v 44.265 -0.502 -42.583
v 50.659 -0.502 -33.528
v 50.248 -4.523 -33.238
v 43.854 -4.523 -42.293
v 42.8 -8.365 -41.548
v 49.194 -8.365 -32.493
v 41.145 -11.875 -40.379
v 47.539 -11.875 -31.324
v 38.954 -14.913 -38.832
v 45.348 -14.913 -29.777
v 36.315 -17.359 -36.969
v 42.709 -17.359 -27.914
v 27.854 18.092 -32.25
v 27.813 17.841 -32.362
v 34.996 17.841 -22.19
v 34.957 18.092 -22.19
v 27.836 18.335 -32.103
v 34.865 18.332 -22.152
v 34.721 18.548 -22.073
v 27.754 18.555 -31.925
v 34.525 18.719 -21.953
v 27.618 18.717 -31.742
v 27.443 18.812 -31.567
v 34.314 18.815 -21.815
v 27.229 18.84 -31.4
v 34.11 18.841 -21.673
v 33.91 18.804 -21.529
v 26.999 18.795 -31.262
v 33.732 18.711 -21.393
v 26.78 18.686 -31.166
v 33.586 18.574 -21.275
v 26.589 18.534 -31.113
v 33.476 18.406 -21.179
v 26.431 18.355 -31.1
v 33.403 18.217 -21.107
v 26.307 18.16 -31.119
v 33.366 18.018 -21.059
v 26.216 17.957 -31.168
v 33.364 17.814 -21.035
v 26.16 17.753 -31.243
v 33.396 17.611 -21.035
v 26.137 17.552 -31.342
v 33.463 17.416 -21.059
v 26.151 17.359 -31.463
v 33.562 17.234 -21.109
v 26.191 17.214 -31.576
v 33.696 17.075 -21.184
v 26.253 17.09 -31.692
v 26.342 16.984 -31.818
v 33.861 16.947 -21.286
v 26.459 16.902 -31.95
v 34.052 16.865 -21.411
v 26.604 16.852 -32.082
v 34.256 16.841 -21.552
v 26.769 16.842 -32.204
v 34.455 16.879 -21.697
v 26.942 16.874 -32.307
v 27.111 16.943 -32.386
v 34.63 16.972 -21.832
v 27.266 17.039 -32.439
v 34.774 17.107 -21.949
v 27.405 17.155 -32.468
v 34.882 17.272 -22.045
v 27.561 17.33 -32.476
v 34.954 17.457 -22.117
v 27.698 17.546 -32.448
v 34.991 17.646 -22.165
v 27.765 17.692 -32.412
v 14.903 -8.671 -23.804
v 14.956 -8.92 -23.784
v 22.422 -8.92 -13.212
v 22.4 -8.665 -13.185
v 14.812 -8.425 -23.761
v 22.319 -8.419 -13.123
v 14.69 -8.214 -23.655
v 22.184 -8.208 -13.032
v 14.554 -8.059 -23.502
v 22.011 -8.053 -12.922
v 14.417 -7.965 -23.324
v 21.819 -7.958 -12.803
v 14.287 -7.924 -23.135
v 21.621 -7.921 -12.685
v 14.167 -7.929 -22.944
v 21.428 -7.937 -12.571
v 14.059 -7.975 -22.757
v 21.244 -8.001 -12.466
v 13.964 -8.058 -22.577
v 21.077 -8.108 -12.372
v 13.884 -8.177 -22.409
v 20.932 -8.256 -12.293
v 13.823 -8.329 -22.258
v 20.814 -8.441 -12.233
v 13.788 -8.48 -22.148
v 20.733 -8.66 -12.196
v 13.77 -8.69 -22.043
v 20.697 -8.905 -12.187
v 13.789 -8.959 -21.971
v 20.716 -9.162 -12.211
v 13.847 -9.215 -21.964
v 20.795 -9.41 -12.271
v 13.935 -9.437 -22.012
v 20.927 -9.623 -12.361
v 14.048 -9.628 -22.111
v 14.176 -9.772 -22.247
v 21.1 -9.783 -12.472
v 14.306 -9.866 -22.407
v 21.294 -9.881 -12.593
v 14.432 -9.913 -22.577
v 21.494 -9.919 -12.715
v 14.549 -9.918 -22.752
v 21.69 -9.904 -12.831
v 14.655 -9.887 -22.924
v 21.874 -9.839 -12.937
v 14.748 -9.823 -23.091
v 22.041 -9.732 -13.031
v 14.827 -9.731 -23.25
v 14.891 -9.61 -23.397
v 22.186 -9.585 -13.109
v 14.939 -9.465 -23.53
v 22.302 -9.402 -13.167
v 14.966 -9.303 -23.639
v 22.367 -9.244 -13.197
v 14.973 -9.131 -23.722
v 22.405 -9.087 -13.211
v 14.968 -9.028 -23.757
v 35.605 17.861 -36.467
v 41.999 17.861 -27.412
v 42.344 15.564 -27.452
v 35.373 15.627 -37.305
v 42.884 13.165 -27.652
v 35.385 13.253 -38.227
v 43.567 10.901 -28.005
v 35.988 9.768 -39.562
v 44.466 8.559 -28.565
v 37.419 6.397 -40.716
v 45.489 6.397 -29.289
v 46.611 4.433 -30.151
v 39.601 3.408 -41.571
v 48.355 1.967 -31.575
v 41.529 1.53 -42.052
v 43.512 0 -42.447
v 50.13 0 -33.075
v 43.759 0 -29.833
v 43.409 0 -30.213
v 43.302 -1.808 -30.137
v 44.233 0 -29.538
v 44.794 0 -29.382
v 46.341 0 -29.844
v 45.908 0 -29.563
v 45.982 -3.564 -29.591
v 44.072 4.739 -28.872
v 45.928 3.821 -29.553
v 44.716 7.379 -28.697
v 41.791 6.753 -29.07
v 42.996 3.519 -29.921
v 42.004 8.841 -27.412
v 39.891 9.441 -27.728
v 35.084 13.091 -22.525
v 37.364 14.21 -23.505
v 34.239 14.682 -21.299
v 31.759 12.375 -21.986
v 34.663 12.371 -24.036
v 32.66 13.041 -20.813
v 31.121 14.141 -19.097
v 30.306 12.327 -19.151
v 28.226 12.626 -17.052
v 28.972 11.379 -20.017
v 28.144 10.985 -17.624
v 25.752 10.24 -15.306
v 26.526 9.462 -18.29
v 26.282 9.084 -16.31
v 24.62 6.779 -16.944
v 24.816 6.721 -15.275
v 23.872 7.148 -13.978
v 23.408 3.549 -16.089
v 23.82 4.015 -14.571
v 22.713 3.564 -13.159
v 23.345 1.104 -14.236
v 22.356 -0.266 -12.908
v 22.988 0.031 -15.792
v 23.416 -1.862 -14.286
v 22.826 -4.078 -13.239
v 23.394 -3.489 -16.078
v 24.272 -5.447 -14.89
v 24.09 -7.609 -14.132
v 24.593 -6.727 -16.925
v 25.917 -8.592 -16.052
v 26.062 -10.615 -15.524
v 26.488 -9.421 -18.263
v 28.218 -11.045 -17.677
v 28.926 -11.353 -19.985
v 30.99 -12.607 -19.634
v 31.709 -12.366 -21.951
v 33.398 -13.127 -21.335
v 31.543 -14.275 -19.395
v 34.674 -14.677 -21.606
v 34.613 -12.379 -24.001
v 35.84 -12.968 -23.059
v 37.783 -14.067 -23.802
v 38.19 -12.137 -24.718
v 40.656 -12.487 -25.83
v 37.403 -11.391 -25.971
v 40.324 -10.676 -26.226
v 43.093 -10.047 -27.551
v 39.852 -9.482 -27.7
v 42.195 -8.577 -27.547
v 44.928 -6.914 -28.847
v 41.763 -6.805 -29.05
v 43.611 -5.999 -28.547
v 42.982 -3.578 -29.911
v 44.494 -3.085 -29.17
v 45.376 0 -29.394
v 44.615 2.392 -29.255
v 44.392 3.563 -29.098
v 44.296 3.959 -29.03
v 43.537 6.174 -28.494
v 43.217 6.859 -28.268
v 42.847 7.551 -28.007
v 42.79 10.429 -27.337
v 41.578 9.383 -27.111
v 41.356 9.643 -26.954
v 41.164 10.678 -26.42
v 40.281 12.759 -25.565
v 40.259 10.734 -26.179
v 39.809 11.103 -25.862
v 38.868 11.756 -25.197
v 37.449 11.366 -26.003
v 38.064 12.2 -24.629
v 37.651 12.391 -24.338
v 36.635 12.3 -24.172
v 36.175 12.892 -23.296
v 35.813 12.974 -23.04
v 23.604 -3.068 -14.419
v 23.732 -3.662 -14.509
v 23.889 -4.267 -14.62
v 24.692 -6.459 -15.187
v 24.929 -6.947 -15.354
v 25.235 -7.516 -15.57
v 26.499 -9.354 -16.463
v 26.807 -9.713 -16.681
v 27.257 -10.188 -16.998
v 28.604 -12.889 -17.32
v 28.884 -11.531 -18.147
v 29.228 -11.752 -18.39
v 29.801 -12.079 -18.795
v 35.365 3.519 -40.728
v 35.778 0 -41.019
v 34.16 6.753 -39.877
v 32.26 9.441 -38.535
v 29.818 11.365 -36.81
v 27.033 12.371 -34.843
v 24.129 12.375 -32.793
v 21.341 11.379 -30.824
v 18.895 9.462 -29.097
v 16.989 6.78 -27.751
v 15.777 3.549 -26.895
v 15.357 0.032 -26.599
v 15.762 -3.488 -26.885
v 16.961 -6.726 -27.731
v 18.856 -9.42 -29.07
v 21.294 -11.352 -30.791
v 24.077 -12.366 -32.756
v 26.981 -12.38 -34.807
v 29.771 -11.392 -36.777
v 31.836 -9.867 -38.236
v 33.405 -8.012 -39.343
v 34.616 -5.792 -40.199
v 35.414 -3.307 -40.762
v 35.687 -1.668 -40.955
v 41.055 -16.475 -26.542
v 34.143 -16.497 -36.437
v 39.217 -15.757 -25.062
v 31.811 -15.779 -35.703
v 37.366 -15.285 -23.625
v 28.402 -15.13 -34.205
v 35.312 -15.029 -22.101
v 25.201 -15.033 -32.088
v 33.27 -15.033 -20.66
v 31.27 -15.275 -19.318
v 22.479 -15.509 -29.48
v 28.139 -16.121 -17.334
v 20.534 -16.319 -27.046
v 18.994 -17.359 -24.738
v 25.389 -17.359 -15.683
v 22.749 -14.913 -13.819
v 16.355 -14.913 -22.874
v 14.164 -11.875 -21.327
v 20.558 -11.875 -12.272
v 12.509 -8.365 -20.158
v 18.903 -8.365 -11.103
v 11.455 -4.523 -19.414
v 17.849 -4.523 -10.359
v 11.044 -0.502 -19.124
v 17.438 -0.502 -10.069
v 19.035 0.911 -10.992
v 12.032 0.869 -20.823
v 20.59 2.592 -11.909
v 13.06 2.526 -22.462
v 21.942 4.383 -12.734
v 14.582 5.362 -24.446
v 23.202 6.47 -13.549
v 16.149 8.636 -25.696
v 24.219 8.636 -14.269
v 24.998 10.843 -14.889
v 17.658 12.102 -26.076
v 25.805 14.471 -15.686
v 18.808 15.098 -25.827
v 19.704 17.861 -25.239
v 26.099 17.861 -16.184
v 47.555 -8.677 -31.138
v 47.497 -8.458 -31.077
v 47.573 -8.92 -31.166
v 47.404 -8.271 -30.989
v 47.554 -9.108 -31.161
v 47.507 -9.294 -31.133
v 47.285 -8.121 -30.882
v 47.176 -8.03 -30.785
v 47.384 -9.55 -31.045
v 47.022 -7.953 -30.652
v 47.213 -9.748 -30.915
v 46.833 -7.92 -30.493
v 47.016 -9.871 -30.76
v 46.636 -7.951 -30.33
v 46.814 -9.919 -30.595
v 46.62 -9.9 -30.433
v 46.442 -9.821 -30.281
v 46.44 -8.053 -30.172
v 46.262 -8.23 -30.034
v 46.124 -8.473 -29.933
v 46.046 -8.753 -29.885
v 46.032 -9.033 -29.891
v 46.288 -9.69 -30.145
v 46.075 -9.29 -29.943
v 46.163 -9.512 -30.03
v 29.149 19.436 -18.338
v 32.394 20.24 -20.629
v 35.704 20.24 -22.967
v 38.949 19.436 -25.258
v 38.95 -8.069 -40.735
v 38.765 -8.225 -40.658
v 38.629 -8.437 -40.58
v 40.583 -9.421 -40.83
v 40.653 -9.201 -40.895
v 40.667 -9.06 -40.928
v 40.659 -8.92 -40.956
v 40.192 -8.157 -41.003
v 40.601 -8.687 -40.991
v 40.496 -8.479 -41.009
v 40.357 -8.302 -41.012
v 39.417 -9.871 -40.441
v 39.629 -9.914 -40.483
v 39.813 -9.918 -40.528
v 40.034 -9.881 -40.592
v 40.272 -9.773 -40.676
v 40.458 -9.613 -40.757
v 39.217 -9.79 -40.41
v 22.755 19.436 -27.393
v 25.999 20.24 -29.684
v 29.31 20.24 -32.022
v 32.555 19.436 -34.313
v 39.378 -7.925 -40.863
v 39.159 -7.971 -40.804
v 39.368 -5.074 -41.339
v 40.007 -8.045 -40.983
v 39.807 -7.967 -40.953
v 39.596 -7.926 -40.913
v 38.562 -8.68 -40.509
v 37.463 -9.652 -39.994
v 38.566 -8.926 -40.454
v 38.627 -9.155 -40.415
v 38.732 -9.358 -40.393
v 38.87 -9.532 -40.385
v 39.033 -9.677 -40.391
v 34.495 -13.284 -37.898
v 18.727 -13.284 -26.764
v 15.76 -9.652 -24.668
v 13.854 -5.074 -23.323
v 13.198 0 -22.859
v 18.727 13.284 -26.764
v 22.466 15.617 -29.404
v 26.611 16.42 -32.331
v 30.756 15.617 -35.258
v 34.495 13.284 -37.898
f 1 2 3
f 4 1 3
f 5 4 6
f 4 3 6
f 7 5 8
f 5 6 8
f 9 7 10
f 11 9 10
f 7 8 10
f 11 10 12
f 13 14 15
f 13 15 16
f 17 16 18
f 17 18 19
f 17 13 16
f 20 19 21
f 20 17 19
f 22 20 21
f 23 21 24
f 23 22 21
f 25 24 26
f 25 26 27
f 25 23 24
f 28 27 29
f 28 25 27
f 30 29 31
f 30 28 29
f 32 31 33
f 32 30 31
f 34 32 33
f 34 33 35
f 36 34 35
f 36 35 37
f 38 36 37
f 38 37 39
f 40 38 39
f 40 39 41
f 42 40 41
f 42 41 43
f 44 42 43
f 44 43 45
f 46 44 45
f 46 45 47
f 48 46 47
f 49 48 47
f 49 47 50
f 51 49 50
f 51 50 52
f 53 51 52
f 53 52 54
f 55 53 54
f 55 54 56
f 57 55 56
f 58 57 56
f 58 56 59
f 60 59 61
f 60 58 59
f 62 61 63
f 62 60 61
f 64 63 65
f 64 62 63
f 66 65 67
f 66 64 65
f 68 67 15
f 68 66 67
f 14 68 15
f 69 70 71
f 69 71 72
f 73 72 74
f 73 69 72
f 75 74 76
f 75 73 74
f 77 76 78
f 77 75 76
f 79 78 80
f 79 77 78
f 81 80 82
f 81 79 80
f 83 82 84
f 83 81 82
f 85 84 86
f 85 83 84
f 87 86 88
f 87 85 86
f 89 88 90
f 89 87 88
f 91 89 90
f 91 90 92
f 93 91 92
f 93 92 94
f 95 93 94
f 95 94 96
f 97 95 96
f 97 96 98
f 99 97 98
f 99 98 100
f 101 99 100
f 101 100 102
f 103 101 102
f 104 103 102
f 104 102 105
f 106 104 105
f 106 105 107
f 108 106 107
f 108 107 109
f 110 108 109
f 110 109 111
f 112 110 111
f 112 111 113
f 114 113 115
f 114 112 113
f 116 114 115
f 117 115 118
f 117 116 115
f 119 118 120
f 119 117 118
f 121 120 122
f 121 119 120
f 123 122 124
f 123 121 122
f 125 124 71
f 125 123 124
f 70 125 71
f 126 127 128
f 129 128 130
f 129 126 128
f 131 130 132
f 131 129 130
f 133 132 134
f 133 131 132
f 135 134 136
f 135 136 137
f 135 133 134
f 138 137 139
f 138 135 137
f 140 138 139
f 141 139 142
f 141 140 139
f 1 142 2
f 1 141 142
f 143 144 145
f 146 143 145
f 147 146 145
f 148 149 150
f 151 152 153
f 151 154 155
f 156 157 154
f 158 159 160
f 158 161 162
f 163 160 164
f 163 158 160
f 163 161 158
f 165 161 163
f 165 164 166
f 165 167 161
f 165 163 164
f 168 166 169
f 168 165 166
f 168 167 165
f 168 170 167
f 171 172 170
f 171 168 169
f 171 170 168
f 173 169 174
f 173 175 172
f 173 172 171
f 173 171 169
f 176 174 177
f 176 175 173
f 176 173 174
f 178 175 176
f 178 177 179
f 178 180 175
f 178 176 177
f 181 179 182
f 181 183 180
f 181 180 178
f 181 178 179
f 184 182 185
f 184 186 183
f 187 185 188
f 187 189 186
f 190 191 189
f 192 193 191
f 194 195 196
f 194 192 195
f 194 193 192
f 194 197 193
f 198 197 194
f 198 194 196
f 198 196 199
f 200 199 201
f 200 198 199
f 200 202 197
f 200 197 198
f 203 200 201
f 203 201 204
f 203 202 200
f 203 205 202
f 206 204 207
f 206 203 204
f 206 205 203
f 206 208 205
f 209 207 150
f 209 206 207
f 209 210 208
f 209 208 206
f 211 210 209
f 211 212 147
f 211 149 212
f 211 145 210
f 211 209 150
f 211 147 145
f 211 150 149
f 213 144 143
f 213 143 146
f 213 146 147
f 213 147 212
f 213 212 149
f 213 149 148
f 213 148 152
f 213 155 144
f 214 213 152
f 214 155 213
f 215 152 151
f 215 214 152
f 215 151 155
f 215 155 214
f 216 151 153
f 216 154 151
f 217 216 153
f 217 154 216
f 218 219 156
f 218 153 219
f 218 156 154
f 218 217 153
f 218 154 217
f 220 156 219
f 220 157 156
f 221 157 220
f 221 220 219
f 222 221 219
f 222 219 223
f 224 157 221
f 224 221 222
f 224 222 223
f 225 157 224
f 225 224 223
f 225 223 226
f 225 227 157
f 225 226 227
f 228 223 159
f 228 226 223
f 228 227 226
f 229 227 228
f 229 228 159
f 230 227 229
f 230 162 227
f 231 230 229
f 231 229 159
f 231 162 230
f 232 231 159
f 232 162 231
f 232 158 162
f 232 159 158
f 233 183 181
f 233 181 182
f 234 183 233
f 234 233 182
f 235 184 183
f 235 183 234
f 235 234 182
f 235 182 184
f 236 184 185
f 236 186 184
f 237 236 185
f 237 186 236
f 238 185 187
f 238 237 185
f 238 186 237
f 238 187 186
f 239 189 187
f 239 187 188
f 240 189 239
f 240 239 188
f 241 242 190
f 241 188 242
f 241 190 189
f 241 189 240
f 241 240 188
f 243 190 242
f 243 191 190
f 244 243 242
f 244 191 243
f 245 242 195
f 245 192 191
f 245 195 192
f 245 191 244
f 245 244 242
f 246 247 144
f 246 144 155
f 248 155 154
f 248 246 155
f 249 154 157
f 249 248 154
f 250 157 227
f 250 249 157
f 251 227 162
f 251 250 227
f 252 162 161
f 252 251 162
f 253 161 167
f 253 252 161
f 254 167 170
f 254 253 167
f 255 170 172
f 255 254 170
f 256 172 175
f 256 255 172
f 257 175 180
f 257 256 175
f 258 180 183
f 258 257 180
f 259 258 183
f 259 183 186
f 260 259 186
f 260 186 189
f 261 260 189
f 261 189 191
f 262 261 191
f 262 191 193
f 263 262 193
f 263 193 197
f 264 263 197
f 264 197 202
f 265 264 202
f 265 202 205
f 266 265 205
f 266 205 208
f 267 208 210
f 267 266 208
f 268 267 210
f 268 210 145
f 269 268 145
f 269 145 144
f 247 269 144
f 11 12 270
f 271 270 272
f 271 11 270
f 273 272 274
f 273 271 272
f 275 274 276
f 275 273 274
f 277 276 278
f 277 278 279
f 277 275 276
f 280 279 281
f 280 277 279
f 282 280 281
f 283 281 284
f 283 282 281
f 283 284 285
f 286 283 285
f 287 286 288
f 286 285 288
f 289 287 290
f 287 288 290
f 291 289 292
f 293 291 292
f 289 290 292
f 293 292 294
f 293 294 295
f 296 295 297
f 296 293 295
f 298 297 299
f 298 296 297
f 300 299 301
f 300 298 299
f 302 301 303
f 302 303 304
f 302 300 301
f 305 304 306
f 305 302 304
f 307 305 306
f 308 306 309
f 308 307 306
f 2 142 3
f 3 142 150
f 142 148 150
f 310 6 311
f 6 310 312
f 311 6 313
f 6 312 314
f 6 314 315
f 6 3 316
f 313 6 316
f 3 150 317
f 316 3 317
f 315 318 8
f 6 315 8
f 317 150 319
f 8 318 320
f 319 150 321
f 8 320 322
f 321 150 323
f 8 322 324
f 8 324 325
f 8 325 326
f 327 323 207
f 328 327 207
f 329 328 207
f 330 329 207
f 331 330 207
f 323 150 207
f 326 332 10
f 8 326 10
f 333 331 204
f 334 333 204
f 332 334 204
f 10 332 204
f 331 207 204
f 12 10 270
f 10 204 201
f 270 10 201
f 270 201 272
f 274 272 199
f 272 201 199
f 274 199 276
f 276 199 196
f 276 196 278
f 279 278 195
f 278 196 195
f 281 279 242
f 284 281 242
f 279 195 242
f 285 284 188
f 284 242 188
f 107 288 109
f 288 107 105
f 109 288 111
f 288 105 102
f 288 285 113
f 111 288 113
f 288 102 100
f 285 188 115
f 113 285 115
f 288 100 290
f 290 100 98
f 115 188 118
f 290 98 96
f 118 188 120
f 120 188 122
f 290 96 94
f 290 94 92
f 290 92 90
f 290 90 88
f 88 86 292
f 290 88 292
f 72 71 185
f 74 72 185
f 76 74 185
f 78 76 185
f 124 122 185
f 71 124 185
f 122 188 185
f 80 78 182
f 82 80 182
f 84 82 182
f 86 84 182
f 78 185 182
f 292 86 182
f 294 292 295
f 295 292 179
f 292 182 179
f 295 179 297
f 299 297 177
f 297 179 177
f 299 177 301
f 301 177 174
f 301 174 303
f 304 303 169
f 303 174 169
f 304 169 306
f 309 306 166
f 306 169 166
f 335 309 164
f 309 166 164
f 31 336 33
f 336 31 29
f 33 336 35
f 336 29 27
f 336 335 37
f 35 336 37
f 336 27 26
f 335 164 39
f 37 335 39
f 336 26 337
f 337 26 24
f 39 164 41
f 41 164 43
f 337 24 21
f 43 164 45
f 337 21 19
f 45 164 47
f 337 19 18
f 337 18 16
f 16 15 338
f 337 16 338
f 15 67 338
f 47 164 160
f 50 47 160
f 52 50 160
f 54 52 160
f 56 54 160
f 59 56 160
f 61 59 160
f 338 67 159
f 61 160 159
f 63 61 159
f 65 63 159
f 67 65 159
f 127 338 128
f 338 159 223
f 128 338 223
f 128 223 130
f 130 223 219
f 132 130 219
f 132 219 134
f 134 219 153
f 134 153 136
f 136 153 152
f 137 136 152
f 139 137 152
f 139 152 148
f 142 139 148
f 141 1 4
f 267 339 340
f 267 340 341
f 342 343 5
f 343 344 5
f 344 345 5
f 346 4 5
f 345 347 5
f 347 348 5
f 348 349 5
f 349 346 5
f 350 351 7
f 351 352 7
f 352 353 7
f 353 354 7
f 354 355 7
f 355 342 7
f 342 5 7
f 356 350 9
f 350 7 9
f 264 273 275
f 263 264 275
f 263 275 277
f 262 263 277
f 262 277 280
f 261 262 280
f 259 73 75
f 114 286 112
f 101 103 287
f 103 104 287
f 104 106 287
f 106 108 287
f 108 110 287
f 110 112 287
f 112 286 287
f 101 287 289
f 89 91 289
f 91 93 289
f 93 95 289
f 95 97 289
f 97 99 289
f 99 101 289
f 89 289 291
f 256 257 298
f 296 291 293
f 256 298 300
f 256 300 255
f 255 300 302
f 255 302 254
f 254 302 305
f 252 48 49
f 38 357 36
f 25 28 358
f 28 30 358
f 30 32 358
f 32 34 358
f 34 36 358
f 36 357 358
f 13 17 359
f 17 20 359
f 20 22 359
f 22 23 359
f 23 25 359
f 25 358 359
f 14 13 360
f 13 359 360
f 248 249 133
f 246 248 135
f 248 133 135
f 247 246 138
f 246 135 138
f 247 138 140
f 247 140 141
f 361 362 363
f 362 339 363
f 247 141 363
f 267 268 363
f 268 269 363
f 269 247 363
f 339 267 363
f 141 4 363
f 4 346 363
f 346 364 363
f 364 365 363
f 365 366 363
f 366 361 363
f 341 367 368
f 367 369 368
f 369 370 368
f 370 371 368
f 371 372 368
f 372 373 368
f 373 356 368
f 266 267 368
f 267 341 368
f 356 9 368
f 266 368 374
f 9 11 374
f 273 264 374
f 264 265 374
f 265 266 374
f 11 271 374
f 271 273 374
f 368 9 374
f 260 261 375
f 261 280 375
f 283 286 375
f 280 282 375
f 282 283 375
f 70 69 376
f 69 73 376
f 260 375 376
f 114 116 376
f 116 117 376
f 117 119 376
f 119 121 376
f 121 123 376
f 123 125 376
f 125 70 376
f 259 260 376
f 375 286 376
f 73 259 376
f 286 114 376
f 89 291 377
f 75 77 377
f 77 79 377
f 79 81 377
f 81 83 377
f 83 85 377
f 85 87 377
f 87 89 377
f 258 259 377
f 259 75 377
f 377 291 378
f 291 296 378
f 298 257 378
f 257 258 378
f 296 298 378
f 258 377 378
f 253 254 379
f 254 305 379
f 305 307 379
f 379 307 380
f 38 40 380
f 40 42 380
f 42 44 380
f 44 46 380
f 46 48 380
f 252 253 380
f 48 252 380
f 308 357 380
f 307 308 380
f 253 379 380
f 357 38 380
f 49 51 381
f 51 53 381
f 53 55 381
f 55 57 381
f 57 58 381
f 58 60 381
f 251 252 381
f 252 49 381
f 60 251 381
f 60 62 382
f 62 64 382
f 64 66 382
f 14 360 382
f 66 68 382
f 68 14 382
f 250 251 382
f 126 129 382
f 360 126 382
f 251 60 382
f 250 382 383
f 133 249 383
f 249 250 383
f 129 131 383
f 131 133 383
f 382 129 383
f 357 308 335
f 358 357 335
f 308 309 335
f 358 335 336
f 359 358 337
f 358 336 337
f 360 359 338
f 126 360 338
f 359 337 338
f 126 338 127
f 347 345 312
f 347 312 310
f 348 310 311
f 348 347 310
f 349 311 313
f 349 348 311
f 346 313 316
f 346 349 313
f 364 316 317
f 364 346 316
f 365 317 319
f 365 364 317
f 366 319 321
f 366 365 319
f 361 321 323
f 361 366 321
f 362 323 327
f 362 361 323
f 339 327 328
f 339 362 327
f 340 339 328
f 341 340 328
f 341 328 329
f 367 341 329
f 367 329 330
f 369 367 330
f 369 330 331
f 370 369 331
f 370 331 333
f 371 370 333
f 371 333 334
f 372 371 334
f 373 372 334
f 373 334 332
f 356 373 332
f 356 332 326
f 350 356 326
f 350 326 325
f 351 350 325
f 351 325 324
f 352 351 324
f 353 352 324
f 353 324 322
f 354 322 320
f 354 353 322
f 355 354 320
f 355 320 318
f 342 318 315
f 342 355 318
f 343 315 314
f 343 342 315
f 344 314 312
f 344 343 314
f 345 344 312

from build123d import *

# Parameters (mm, degrees)
SKETCH_2_R          = 1
SKETCH_2_R_2        = 25
SKETCH_2_R_3        = 12.5
CUT_EXTRUDE_1_DEPTH = 24
FILLET_1_R          = 2


with BuildPart() as part:
    # 草图1 → 旋转1 (revolve)
    with BuildSketch(Plane(origin=(0, 0, 0), x_dir=(1, 0, 0), z_dir=(0, 1, 0))):
        Polygon((16.733350813, 28.983013789), (11.038988511, 19.120088966), (17.433204862, 10.06506552), (26.42596579, 15.257038463), align=None)
    revolve(axis=Axis((35.122395357, 0, -20.277924414), (-0.576829805989874, 0, -0.8168643552767402)))

    # 草图2 → 切除-拉伸1 (cut)
    with BuildSketch(Plane(origin=(1.603790962, 0, 2.271171941), x_dir=(0.8168643552767402, 0, -0.576829805989874), z_dir=(0.576829805989874, 0, 0.8168643552767403))):
        with Locations((40.387144045, 17.840750604)):
            Circle(SKETCH_2_R)
        with Locations((5.746127894, 20)):
            Circle(SKETCH_2_R_2)
        with Locations((75.028160197, 20)):
            Circle(SKETCH_2_R_2)
        with Locations((55.837687291, -8.920375302)):
            Circle(SKETCH_2_R)
        with Locations((40.387144045, -40)):
            Circle(SKETCH_2_R_2)
        with Locations((24.9366008, -8.920375302)):
            Circle(SKETCH_2_R)
        with Locations((40.387144045, 0)):
            Circle(SKETCH_2_R_3)
    extrude(amount=-CUT_EXTRUDE_1_DEPTH, mode=Mode.SUBTRACT)

    # 圆角1
    fillet_1_edges = [part.edges().sort_by_distance(p)[0] for p in [
        (34.46266284, 12.5, -21.21218955),
    ]]
    fillet(fillet_1_edges, radius=FILLET_1_R)


solid = part.part
